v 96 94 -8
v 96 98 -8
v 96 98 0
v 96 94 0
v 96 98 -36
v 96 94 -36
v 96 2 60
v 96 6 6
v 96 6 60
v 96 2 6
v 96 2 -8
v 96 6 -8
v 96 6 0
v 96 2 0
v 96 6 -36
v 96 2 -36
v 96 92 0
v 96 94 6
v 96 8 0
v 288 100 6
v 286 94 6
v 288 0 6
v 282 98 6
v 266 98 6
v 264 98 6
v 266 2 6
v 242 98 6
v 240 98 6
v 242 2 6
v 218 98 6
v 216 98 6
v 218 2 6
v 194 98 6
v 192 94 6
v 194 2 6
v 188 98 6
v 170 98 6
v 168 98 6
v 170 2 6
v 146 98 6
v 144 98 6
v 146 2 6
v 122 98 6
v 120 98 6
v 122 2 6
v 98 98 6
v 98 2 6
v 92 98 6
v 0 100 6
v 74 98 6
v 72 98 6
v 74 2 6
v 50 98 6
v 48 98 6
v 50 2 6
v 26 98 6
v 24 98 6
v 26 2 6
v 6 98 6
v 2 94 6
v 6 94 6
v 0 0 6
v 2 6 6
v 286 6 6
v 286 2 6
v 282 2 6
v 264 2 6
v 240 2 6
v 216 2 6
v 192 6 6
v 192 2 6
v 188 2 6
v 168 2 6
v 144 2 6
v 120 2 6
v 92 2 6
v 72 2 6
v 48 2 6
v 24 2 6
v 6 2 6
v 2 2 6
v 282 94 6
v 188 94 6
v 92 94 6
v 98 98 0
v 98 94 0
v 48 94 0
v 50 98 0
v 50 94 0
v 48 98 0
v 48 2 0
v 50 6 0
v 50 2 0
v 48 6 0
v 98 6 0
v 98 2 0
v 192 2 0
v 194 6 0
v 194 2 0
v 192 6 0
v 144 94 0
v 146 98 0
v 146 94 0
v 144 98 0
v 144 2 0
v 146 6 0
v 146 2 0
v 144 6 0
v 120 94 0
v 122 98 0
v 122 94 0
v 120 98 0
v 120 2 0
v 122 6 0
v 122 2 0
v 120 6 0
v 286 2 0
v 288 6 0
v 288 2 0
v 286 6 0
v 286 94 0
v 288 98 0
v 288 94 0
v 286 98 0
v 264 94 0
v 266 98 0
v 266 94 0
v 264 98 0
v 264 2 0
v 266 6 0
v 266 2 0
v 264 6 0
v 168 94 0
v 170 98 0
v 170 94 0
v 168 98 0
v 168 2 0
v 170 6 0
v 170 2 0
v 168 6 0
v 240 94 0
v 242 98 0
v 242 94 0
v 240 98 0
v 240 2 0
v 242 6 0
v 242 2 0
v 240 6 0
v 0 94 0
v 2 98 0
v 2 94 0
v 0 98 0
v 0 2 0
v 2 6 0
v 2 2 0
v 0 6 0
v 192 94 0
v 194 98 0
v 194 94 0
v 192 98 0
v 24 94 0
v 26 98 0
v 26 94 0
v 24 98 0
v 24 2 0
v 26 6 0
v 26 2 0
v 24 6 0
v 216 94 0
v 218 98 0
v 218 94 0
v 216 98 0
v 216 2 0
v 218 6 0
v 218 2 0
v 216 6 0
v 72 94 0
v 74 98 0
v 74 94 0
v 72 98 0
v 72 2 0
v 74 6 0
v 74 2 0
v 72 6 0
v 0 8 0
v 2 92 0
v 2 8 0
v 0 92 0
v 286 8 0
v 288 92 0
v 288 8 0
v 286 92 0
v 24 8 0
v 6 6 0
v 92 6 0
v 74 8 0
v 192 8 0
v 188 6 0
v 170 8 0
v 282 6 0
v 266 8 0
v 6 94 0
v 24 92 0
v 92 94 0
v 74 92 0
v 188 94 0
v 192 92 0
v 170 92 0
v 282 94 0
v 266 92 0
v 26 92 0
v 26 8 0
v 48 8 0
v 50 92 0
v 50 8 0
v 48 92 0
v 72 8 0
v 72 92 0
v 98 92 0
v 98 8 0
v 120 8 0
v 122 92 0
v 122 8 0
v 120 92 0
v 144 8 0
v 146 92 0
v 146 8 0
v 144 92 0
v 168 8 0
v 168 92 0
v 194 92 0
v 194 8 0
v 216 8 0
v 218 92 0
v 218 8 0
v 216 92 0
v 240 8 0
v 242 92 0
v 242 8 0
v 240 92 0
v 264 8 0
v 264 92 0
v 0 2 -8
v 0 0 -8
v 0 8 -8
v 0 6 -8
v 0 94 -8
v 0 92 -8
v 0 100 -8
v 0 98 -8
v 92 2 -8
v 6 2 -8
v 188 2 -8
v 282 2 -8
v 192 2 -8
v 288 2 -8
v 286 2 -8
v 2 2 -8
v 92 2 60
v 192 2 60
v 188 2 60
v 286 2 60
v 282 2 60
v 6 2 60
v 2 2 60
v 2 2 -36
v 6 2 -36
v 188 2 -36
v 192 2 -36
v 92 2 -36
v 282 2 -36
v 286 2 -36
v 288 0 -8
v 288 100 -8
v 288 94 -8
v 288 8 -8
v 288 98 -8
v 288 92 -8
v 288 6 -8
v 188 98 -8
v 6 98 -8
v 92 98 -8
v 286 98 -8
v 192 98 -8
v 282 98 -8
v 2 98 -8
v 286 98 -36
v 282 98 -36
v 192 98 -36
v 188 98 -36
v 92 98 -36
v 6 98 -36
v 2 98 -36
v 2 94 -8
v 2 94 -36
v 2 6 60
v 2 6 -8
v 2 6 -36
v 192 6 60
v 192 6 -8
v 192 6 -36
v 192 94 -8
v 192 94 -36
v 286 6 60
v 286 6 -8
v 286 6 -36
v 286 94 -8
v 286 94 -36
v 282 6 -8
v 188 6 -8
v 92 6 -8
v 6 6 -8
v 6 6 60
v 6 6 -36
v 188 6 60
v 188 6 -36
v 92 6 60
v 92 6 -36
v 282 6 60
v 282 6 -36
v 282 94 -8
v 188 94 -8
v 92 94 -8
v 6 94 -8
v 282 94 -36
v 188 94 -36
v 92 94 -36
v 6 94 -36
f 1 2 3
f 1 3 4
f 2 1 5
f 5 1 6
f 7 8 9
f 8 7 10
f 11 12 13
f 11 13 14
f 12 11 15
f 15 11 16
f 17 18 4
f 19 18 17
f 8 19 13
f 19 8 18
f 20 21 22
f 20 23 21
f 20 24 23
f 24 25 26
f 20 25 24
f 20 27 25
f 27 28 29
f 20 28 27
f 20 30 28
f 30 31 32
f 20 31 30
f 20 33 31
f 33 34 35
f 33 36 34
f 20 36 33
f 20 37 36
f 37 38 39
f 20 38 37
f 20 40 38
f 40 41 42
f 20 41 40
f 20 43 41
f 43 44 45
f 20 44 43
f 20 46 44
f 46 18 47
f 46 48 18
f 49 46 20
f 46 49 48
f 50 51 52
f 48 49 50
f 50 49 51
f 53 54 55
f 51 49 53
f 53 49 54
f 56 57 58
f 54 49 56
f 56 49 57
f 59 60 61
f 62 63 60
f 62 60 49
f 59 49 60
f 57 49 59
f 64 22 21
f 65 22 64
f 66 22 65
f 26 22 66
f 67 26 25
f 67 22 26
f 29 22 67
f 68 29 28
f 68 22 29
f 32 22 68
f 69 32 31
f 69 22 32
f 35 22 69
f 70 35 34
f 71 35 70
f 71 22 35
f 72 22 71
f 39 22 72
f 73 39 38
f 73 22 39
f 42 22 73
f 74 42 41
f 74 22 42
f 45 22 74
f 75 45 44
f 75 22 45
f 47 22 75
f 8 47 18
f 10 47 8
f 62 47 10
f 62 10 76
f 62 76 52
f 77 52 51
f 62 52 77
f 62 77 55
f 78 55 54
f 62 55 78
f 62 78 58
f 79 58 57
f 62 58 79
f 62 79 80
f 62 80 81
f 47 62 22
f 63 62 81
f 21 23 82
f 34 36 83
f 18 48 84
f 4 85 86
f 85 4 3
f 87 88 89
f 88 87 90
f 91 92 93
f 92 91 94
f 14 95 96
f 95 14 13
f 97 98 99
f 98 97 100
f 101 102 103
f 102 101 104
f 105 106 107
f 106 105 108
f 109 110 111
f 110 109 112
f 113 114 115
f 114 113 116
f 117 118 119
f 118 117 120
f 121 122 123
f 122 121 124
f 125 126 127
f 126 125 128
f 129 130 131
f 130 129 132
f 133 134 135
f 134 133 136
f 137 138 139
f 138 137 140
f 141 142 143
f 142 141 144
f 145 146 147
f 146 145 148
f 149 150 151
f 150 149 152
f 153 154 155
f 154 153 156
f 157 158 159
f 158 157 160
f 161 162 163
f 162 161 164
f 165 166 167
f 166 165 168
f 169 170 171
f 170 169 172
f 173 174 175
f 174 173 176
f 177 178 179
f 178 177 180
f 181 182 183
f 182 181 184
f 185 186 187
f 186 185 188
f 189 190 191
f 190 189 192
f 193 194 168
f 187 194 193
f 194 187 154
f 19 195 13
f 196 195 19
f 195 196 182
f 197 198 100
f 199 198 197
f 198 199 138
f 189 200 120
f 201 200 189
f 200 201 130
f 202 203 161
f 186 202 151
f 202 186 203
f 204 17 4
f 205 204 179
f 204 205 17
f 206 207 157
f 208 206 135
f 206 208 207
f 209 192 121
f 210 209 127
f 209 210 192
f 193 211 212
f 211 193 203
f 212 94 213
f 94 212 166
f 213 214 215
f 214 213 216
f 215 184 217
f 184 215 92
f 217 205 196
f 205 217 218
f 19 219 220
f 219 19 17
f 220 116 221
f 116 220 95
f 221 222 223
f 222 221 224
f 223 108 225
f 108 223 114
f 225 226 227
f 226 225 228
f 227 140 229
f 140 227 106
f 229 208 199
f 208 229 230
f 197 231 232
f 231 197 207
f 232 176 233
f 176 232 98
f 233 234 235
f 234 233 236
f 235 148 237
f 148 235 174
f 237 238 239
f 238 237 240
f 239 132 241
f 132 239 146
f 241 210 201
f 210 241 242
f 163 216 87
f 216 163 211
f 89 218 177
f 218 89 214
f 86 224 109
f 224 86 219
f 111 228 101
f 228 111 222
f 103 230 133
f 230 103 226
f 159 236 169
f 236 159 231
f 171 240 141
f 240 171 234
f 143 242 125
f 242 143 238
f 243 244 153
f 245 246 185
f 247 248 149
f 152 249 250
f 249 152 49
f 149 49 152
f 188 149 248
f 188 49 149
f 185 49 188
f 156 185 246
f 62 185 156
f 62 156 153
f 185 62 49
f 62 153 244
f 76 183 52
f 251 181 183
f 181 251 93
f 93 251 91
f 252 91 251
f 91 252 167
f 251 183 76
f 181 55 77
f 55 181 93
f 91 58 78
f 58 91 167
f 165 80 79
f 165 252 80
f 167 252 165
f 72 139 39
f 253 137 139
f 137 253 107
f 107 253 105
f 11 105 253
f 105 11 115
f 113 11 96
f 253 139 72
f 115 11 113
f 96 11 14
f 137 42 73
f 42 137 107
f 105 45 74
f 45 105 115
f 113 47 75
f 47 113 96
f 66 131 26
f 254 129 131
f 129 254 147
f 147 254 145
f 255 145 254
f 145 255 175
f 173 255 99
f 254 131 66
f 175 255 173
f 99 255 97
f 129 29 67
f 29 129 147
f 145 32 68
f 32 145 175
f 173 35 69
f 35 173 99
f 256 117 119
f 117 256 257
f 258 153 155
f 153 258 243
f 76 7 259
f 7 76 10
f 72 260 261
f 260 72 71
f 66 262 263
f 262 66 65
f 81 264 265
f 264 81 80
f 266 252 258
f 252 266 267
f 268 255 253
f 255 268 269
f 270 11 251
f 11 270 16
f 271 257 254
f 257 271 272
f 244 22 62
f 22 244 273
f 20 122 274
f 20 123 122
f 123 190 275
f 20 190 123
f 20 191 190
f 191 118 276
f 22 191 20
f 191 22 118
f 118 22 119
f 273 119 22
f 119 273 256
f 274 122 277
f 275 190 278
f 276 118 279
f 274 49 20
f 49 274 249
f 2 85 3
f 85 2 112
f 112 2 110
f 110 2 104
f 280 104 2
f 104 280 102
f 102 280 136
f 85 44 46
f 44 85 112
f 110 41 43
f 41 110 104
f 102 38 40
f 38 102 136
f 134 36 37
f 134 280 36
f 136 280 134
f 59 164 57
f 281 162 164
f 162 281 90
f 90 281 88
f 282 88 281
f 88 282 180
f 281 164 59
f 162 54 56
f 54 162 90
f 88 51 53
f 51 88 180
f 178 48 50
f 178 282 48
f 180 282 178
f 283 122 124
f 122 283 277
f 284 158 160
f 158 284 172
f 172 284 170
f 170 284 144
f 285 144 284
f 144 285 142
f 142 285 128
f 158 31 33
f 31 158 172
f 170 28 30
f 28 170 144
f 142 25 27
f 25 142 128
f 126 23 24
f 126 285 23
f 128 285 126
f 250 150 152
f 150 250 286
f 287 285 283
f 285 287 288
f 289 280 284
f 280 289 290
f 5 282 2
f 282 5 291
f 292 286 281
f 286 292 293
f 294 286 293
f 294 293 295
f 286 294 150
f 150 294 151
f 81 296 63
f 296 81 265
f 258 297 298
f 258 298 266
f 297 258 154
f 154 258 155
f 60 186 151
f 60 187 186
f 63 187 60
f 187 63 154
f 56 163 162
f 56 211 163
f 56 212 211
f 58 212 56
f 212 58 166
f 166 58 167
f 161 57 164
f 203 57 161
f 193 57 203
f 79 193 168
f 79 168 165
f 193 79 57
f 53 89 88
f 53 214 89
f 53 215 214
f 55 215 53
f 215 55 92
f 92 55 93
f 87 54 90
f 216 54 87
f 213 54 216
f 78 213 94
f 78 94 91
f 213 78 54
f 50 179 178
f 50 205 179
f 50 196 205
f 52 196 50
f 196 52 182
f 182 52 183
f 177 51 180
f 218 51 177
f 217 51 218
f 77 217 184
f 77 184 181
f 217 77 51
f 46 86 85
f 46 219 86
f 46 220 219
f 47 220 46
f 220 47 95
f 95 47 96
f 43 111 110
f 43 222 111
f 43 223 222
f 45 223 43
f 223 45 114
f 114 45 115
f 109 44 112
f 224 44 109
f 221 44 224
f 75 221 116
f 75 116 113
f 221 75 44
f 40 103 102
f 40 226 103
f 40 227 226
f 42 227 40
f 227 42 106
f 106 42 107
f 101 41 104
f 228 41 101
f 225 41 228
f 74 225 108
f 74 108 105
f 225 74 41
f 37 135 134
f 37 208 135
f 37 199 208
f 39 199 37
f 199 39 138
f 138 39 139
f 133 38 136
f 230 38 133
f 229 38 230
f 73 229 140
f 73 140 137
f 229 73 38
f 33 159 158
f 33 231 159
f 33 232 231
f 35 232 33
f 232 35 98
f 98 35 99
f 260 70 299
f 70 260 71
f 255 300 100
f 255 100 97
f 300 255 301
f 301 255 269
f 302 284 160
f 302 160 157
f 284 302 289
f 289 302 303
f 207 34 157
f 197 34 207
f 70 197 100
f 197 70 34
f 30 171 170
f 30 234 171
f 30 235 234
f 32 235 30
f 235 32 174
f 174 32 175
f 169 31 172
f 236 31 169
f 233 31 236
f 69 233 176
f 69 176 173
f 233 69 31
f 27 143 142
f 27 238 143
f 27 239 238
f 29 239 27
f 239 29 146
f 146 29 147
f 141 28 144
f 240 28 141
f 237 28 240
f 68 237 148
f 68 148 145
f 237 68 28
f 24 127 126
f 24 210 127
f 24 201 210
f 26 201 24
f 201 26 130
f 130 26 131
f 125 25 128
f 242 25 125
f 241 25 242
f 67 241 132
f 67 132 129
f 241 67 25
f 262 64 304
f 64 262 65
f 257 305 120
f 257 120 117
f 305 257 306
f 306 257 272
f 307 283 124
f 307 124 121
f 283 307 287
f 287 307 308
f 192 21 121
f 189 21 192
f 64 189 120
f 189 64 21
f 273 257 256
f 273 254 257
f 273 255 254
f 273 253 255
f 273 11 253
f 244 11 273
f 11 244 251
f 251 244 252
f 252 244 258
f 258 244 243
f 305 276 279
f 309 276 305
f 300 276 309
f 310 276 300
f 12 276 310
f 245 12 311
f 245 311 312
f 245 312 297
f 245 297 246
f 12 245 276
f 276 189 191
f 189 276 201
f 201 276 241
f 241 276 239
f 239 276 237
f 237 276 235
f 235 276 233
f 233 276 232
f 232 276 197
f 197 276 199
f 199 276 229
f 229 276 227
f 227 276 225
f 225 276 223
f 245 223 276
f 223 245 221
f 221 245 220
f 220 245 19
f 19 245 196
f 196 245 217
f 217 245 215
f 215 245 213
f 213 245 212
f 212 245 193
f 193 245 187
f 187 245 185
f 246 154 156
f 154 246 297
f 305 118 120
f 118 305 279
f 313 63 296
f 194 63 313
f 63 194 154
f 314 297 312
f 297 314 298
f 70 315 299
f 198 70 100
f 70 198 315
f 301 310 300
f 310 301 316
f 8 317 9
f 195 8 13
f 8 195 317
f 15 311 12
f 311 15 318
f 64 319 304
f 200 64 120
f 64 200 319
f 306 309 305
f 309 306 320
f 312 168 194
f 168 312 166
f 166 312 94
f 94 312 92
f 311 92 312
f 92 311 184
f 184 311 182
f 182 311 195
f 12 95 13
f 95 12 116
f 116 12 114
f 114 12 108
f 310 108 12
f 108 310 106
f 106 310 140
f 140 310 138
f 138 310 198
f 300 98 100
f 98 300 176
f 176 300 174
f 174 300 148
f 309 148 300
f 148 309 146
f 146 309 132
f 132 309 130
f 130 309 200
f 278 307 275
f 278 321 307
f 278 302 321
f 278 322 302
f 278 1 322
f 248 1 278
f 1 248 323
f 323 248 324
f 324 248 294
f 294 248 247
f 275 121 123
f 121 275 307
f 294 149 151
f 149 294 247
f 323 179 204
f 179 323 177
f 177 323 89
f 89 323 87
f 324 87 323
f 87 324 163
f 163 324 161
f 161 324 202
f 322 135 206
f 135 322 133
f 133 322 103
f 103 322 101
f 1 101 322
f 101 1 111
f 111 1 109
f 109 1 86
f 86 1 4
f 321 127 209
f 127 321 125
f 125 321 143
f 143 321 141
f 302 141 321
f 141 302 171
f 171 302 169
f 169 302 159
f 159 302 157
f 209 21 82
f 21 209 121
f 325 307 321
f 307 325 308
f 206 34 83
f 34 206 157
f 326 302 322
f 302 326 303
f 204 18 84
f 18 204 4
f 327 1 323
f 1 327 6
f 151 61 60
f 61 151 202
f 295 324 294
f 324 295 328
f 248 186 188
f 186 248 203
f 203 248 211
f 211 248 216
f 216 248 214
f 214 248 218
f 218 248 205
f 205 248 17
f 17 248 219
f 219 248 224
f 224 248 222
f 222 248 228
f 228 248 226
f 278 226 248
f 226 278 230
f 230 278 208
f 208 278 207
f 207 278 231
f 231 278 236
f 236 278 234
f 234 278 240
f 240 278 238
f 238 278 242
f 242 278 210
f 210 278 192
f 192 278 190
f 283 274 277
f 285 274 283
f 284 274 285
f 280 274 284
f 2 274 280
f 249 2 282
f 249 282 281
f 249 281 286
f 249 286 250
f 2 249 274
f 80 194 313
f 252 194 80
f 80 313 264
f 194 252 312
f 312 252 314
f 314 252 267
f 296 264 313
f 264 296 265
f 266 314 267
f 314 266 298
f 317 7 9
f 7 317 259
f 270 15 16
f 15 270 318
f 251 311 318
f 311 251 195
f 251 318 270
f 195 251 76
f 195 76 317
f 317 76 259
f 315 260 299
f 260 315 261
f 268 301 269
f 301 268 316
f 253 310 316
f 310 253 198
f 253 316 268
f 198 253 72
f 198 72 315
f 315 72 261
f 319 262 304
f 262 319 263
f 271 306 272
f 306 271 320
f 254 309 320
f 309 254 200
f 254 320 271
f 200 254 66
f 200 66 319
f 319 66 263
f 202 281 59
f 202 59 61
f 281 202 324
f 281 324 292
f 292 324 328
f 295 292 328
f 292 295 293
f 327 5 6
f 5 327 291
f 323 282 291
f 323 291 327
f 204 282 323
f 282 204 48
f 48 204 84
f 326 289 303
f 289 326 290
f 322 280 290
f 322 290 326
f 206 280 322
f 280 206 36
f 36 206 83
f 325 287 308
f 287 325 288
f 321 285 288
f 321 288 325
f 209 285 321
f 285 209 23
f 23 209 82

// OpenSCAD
deck_frame_h = 6;
deck_support_h = 8;

color("Sienna"){
translate([0,0,0]) cube([96,2,deck_frame_h]);
translate([96,0,0]) cube([96,2,deck_frame_h]);
translate([192,0,0]) cube([96,2,deck_frame_h]);

translate([0,98,0]) cube([96,2,deck_frame_h]);
translate([96,98,0]) cube([96,2,deck_frame_h]);
translate([192,98,0]) cube([96,2,deck_frame_h]);


translate([0,2,0]) cube([2,96,deck_frame_h]);
translate([24,2,0]) cube([2,96,deck_frame_h]);
translate([48,2,0]) cube([2,96,deck_frame_h]);
translate([72,2,0]) cube([2,96,deck_frame_h]);
translate([96,2,0]) cube([2,96,deck_frame_h]);
translate([120,2,0]) cube([2,96,deck_frame_h]);
translate([144,2,0]) cube([2,96,deck_frame_h]);
translate([168,2,0]) cube([2,96,deck_frame_h]);
translate([192,2,0]) cube([2,96,deck_frame_h]);
translate([216,2,0]) cube([2,96,deck_frame_h]);
translate([240,2,0]) cube([2,96,deck_frame_h]);
translate([264,2,0]) cube([2,96,deck_frame_h]);
translate([286,2,0]) cube([2,96,deck_frame_h]);

}

color("SaddleBrown"){
translate([0,0,-deck_support_h]) cube([144,2,deck_support_h]);
translate([144,0,-deck_support_h]) cube([144,2,deck_support_h]);
translate([0,6,-deck_support_h]) cube([144,2,deck_support_h]);
translate([144,6,-deck_support_h]) cube([144,2,deck_support_h]);

translate([0,92,-deck_support_h]) cube([144,2,deck_support_h]);
translate([144,92,-deck_support_h]) cube([144,2,deck_support_h]);
translate([0,98,-deck_support_h]) cube([144,2,deck_support_h]);
translate([144,98,-deck_support_h]) cube([144,2,deck_support_h]);
}

color("Brown"){
translate([2,2,-36]) cube([4,4,96]);
translate([92,2,-36]) cube([4,4,96]);
translate([188,2,-36]) cube([4,4,96]);
translate([282,2,-36]) cube([4,4,96]);
translate([2,94,-36]) cube([4,4,36+deck_frame_h]);
translate([92,94,-36]) cube([4,4,36+deck_frame_h]);
translate([188,94,-36]) cube([4,4,36+deck_frame_h]);
translate([282,94,-36]) cube([4,4,36+deck_frame_h]);
}
